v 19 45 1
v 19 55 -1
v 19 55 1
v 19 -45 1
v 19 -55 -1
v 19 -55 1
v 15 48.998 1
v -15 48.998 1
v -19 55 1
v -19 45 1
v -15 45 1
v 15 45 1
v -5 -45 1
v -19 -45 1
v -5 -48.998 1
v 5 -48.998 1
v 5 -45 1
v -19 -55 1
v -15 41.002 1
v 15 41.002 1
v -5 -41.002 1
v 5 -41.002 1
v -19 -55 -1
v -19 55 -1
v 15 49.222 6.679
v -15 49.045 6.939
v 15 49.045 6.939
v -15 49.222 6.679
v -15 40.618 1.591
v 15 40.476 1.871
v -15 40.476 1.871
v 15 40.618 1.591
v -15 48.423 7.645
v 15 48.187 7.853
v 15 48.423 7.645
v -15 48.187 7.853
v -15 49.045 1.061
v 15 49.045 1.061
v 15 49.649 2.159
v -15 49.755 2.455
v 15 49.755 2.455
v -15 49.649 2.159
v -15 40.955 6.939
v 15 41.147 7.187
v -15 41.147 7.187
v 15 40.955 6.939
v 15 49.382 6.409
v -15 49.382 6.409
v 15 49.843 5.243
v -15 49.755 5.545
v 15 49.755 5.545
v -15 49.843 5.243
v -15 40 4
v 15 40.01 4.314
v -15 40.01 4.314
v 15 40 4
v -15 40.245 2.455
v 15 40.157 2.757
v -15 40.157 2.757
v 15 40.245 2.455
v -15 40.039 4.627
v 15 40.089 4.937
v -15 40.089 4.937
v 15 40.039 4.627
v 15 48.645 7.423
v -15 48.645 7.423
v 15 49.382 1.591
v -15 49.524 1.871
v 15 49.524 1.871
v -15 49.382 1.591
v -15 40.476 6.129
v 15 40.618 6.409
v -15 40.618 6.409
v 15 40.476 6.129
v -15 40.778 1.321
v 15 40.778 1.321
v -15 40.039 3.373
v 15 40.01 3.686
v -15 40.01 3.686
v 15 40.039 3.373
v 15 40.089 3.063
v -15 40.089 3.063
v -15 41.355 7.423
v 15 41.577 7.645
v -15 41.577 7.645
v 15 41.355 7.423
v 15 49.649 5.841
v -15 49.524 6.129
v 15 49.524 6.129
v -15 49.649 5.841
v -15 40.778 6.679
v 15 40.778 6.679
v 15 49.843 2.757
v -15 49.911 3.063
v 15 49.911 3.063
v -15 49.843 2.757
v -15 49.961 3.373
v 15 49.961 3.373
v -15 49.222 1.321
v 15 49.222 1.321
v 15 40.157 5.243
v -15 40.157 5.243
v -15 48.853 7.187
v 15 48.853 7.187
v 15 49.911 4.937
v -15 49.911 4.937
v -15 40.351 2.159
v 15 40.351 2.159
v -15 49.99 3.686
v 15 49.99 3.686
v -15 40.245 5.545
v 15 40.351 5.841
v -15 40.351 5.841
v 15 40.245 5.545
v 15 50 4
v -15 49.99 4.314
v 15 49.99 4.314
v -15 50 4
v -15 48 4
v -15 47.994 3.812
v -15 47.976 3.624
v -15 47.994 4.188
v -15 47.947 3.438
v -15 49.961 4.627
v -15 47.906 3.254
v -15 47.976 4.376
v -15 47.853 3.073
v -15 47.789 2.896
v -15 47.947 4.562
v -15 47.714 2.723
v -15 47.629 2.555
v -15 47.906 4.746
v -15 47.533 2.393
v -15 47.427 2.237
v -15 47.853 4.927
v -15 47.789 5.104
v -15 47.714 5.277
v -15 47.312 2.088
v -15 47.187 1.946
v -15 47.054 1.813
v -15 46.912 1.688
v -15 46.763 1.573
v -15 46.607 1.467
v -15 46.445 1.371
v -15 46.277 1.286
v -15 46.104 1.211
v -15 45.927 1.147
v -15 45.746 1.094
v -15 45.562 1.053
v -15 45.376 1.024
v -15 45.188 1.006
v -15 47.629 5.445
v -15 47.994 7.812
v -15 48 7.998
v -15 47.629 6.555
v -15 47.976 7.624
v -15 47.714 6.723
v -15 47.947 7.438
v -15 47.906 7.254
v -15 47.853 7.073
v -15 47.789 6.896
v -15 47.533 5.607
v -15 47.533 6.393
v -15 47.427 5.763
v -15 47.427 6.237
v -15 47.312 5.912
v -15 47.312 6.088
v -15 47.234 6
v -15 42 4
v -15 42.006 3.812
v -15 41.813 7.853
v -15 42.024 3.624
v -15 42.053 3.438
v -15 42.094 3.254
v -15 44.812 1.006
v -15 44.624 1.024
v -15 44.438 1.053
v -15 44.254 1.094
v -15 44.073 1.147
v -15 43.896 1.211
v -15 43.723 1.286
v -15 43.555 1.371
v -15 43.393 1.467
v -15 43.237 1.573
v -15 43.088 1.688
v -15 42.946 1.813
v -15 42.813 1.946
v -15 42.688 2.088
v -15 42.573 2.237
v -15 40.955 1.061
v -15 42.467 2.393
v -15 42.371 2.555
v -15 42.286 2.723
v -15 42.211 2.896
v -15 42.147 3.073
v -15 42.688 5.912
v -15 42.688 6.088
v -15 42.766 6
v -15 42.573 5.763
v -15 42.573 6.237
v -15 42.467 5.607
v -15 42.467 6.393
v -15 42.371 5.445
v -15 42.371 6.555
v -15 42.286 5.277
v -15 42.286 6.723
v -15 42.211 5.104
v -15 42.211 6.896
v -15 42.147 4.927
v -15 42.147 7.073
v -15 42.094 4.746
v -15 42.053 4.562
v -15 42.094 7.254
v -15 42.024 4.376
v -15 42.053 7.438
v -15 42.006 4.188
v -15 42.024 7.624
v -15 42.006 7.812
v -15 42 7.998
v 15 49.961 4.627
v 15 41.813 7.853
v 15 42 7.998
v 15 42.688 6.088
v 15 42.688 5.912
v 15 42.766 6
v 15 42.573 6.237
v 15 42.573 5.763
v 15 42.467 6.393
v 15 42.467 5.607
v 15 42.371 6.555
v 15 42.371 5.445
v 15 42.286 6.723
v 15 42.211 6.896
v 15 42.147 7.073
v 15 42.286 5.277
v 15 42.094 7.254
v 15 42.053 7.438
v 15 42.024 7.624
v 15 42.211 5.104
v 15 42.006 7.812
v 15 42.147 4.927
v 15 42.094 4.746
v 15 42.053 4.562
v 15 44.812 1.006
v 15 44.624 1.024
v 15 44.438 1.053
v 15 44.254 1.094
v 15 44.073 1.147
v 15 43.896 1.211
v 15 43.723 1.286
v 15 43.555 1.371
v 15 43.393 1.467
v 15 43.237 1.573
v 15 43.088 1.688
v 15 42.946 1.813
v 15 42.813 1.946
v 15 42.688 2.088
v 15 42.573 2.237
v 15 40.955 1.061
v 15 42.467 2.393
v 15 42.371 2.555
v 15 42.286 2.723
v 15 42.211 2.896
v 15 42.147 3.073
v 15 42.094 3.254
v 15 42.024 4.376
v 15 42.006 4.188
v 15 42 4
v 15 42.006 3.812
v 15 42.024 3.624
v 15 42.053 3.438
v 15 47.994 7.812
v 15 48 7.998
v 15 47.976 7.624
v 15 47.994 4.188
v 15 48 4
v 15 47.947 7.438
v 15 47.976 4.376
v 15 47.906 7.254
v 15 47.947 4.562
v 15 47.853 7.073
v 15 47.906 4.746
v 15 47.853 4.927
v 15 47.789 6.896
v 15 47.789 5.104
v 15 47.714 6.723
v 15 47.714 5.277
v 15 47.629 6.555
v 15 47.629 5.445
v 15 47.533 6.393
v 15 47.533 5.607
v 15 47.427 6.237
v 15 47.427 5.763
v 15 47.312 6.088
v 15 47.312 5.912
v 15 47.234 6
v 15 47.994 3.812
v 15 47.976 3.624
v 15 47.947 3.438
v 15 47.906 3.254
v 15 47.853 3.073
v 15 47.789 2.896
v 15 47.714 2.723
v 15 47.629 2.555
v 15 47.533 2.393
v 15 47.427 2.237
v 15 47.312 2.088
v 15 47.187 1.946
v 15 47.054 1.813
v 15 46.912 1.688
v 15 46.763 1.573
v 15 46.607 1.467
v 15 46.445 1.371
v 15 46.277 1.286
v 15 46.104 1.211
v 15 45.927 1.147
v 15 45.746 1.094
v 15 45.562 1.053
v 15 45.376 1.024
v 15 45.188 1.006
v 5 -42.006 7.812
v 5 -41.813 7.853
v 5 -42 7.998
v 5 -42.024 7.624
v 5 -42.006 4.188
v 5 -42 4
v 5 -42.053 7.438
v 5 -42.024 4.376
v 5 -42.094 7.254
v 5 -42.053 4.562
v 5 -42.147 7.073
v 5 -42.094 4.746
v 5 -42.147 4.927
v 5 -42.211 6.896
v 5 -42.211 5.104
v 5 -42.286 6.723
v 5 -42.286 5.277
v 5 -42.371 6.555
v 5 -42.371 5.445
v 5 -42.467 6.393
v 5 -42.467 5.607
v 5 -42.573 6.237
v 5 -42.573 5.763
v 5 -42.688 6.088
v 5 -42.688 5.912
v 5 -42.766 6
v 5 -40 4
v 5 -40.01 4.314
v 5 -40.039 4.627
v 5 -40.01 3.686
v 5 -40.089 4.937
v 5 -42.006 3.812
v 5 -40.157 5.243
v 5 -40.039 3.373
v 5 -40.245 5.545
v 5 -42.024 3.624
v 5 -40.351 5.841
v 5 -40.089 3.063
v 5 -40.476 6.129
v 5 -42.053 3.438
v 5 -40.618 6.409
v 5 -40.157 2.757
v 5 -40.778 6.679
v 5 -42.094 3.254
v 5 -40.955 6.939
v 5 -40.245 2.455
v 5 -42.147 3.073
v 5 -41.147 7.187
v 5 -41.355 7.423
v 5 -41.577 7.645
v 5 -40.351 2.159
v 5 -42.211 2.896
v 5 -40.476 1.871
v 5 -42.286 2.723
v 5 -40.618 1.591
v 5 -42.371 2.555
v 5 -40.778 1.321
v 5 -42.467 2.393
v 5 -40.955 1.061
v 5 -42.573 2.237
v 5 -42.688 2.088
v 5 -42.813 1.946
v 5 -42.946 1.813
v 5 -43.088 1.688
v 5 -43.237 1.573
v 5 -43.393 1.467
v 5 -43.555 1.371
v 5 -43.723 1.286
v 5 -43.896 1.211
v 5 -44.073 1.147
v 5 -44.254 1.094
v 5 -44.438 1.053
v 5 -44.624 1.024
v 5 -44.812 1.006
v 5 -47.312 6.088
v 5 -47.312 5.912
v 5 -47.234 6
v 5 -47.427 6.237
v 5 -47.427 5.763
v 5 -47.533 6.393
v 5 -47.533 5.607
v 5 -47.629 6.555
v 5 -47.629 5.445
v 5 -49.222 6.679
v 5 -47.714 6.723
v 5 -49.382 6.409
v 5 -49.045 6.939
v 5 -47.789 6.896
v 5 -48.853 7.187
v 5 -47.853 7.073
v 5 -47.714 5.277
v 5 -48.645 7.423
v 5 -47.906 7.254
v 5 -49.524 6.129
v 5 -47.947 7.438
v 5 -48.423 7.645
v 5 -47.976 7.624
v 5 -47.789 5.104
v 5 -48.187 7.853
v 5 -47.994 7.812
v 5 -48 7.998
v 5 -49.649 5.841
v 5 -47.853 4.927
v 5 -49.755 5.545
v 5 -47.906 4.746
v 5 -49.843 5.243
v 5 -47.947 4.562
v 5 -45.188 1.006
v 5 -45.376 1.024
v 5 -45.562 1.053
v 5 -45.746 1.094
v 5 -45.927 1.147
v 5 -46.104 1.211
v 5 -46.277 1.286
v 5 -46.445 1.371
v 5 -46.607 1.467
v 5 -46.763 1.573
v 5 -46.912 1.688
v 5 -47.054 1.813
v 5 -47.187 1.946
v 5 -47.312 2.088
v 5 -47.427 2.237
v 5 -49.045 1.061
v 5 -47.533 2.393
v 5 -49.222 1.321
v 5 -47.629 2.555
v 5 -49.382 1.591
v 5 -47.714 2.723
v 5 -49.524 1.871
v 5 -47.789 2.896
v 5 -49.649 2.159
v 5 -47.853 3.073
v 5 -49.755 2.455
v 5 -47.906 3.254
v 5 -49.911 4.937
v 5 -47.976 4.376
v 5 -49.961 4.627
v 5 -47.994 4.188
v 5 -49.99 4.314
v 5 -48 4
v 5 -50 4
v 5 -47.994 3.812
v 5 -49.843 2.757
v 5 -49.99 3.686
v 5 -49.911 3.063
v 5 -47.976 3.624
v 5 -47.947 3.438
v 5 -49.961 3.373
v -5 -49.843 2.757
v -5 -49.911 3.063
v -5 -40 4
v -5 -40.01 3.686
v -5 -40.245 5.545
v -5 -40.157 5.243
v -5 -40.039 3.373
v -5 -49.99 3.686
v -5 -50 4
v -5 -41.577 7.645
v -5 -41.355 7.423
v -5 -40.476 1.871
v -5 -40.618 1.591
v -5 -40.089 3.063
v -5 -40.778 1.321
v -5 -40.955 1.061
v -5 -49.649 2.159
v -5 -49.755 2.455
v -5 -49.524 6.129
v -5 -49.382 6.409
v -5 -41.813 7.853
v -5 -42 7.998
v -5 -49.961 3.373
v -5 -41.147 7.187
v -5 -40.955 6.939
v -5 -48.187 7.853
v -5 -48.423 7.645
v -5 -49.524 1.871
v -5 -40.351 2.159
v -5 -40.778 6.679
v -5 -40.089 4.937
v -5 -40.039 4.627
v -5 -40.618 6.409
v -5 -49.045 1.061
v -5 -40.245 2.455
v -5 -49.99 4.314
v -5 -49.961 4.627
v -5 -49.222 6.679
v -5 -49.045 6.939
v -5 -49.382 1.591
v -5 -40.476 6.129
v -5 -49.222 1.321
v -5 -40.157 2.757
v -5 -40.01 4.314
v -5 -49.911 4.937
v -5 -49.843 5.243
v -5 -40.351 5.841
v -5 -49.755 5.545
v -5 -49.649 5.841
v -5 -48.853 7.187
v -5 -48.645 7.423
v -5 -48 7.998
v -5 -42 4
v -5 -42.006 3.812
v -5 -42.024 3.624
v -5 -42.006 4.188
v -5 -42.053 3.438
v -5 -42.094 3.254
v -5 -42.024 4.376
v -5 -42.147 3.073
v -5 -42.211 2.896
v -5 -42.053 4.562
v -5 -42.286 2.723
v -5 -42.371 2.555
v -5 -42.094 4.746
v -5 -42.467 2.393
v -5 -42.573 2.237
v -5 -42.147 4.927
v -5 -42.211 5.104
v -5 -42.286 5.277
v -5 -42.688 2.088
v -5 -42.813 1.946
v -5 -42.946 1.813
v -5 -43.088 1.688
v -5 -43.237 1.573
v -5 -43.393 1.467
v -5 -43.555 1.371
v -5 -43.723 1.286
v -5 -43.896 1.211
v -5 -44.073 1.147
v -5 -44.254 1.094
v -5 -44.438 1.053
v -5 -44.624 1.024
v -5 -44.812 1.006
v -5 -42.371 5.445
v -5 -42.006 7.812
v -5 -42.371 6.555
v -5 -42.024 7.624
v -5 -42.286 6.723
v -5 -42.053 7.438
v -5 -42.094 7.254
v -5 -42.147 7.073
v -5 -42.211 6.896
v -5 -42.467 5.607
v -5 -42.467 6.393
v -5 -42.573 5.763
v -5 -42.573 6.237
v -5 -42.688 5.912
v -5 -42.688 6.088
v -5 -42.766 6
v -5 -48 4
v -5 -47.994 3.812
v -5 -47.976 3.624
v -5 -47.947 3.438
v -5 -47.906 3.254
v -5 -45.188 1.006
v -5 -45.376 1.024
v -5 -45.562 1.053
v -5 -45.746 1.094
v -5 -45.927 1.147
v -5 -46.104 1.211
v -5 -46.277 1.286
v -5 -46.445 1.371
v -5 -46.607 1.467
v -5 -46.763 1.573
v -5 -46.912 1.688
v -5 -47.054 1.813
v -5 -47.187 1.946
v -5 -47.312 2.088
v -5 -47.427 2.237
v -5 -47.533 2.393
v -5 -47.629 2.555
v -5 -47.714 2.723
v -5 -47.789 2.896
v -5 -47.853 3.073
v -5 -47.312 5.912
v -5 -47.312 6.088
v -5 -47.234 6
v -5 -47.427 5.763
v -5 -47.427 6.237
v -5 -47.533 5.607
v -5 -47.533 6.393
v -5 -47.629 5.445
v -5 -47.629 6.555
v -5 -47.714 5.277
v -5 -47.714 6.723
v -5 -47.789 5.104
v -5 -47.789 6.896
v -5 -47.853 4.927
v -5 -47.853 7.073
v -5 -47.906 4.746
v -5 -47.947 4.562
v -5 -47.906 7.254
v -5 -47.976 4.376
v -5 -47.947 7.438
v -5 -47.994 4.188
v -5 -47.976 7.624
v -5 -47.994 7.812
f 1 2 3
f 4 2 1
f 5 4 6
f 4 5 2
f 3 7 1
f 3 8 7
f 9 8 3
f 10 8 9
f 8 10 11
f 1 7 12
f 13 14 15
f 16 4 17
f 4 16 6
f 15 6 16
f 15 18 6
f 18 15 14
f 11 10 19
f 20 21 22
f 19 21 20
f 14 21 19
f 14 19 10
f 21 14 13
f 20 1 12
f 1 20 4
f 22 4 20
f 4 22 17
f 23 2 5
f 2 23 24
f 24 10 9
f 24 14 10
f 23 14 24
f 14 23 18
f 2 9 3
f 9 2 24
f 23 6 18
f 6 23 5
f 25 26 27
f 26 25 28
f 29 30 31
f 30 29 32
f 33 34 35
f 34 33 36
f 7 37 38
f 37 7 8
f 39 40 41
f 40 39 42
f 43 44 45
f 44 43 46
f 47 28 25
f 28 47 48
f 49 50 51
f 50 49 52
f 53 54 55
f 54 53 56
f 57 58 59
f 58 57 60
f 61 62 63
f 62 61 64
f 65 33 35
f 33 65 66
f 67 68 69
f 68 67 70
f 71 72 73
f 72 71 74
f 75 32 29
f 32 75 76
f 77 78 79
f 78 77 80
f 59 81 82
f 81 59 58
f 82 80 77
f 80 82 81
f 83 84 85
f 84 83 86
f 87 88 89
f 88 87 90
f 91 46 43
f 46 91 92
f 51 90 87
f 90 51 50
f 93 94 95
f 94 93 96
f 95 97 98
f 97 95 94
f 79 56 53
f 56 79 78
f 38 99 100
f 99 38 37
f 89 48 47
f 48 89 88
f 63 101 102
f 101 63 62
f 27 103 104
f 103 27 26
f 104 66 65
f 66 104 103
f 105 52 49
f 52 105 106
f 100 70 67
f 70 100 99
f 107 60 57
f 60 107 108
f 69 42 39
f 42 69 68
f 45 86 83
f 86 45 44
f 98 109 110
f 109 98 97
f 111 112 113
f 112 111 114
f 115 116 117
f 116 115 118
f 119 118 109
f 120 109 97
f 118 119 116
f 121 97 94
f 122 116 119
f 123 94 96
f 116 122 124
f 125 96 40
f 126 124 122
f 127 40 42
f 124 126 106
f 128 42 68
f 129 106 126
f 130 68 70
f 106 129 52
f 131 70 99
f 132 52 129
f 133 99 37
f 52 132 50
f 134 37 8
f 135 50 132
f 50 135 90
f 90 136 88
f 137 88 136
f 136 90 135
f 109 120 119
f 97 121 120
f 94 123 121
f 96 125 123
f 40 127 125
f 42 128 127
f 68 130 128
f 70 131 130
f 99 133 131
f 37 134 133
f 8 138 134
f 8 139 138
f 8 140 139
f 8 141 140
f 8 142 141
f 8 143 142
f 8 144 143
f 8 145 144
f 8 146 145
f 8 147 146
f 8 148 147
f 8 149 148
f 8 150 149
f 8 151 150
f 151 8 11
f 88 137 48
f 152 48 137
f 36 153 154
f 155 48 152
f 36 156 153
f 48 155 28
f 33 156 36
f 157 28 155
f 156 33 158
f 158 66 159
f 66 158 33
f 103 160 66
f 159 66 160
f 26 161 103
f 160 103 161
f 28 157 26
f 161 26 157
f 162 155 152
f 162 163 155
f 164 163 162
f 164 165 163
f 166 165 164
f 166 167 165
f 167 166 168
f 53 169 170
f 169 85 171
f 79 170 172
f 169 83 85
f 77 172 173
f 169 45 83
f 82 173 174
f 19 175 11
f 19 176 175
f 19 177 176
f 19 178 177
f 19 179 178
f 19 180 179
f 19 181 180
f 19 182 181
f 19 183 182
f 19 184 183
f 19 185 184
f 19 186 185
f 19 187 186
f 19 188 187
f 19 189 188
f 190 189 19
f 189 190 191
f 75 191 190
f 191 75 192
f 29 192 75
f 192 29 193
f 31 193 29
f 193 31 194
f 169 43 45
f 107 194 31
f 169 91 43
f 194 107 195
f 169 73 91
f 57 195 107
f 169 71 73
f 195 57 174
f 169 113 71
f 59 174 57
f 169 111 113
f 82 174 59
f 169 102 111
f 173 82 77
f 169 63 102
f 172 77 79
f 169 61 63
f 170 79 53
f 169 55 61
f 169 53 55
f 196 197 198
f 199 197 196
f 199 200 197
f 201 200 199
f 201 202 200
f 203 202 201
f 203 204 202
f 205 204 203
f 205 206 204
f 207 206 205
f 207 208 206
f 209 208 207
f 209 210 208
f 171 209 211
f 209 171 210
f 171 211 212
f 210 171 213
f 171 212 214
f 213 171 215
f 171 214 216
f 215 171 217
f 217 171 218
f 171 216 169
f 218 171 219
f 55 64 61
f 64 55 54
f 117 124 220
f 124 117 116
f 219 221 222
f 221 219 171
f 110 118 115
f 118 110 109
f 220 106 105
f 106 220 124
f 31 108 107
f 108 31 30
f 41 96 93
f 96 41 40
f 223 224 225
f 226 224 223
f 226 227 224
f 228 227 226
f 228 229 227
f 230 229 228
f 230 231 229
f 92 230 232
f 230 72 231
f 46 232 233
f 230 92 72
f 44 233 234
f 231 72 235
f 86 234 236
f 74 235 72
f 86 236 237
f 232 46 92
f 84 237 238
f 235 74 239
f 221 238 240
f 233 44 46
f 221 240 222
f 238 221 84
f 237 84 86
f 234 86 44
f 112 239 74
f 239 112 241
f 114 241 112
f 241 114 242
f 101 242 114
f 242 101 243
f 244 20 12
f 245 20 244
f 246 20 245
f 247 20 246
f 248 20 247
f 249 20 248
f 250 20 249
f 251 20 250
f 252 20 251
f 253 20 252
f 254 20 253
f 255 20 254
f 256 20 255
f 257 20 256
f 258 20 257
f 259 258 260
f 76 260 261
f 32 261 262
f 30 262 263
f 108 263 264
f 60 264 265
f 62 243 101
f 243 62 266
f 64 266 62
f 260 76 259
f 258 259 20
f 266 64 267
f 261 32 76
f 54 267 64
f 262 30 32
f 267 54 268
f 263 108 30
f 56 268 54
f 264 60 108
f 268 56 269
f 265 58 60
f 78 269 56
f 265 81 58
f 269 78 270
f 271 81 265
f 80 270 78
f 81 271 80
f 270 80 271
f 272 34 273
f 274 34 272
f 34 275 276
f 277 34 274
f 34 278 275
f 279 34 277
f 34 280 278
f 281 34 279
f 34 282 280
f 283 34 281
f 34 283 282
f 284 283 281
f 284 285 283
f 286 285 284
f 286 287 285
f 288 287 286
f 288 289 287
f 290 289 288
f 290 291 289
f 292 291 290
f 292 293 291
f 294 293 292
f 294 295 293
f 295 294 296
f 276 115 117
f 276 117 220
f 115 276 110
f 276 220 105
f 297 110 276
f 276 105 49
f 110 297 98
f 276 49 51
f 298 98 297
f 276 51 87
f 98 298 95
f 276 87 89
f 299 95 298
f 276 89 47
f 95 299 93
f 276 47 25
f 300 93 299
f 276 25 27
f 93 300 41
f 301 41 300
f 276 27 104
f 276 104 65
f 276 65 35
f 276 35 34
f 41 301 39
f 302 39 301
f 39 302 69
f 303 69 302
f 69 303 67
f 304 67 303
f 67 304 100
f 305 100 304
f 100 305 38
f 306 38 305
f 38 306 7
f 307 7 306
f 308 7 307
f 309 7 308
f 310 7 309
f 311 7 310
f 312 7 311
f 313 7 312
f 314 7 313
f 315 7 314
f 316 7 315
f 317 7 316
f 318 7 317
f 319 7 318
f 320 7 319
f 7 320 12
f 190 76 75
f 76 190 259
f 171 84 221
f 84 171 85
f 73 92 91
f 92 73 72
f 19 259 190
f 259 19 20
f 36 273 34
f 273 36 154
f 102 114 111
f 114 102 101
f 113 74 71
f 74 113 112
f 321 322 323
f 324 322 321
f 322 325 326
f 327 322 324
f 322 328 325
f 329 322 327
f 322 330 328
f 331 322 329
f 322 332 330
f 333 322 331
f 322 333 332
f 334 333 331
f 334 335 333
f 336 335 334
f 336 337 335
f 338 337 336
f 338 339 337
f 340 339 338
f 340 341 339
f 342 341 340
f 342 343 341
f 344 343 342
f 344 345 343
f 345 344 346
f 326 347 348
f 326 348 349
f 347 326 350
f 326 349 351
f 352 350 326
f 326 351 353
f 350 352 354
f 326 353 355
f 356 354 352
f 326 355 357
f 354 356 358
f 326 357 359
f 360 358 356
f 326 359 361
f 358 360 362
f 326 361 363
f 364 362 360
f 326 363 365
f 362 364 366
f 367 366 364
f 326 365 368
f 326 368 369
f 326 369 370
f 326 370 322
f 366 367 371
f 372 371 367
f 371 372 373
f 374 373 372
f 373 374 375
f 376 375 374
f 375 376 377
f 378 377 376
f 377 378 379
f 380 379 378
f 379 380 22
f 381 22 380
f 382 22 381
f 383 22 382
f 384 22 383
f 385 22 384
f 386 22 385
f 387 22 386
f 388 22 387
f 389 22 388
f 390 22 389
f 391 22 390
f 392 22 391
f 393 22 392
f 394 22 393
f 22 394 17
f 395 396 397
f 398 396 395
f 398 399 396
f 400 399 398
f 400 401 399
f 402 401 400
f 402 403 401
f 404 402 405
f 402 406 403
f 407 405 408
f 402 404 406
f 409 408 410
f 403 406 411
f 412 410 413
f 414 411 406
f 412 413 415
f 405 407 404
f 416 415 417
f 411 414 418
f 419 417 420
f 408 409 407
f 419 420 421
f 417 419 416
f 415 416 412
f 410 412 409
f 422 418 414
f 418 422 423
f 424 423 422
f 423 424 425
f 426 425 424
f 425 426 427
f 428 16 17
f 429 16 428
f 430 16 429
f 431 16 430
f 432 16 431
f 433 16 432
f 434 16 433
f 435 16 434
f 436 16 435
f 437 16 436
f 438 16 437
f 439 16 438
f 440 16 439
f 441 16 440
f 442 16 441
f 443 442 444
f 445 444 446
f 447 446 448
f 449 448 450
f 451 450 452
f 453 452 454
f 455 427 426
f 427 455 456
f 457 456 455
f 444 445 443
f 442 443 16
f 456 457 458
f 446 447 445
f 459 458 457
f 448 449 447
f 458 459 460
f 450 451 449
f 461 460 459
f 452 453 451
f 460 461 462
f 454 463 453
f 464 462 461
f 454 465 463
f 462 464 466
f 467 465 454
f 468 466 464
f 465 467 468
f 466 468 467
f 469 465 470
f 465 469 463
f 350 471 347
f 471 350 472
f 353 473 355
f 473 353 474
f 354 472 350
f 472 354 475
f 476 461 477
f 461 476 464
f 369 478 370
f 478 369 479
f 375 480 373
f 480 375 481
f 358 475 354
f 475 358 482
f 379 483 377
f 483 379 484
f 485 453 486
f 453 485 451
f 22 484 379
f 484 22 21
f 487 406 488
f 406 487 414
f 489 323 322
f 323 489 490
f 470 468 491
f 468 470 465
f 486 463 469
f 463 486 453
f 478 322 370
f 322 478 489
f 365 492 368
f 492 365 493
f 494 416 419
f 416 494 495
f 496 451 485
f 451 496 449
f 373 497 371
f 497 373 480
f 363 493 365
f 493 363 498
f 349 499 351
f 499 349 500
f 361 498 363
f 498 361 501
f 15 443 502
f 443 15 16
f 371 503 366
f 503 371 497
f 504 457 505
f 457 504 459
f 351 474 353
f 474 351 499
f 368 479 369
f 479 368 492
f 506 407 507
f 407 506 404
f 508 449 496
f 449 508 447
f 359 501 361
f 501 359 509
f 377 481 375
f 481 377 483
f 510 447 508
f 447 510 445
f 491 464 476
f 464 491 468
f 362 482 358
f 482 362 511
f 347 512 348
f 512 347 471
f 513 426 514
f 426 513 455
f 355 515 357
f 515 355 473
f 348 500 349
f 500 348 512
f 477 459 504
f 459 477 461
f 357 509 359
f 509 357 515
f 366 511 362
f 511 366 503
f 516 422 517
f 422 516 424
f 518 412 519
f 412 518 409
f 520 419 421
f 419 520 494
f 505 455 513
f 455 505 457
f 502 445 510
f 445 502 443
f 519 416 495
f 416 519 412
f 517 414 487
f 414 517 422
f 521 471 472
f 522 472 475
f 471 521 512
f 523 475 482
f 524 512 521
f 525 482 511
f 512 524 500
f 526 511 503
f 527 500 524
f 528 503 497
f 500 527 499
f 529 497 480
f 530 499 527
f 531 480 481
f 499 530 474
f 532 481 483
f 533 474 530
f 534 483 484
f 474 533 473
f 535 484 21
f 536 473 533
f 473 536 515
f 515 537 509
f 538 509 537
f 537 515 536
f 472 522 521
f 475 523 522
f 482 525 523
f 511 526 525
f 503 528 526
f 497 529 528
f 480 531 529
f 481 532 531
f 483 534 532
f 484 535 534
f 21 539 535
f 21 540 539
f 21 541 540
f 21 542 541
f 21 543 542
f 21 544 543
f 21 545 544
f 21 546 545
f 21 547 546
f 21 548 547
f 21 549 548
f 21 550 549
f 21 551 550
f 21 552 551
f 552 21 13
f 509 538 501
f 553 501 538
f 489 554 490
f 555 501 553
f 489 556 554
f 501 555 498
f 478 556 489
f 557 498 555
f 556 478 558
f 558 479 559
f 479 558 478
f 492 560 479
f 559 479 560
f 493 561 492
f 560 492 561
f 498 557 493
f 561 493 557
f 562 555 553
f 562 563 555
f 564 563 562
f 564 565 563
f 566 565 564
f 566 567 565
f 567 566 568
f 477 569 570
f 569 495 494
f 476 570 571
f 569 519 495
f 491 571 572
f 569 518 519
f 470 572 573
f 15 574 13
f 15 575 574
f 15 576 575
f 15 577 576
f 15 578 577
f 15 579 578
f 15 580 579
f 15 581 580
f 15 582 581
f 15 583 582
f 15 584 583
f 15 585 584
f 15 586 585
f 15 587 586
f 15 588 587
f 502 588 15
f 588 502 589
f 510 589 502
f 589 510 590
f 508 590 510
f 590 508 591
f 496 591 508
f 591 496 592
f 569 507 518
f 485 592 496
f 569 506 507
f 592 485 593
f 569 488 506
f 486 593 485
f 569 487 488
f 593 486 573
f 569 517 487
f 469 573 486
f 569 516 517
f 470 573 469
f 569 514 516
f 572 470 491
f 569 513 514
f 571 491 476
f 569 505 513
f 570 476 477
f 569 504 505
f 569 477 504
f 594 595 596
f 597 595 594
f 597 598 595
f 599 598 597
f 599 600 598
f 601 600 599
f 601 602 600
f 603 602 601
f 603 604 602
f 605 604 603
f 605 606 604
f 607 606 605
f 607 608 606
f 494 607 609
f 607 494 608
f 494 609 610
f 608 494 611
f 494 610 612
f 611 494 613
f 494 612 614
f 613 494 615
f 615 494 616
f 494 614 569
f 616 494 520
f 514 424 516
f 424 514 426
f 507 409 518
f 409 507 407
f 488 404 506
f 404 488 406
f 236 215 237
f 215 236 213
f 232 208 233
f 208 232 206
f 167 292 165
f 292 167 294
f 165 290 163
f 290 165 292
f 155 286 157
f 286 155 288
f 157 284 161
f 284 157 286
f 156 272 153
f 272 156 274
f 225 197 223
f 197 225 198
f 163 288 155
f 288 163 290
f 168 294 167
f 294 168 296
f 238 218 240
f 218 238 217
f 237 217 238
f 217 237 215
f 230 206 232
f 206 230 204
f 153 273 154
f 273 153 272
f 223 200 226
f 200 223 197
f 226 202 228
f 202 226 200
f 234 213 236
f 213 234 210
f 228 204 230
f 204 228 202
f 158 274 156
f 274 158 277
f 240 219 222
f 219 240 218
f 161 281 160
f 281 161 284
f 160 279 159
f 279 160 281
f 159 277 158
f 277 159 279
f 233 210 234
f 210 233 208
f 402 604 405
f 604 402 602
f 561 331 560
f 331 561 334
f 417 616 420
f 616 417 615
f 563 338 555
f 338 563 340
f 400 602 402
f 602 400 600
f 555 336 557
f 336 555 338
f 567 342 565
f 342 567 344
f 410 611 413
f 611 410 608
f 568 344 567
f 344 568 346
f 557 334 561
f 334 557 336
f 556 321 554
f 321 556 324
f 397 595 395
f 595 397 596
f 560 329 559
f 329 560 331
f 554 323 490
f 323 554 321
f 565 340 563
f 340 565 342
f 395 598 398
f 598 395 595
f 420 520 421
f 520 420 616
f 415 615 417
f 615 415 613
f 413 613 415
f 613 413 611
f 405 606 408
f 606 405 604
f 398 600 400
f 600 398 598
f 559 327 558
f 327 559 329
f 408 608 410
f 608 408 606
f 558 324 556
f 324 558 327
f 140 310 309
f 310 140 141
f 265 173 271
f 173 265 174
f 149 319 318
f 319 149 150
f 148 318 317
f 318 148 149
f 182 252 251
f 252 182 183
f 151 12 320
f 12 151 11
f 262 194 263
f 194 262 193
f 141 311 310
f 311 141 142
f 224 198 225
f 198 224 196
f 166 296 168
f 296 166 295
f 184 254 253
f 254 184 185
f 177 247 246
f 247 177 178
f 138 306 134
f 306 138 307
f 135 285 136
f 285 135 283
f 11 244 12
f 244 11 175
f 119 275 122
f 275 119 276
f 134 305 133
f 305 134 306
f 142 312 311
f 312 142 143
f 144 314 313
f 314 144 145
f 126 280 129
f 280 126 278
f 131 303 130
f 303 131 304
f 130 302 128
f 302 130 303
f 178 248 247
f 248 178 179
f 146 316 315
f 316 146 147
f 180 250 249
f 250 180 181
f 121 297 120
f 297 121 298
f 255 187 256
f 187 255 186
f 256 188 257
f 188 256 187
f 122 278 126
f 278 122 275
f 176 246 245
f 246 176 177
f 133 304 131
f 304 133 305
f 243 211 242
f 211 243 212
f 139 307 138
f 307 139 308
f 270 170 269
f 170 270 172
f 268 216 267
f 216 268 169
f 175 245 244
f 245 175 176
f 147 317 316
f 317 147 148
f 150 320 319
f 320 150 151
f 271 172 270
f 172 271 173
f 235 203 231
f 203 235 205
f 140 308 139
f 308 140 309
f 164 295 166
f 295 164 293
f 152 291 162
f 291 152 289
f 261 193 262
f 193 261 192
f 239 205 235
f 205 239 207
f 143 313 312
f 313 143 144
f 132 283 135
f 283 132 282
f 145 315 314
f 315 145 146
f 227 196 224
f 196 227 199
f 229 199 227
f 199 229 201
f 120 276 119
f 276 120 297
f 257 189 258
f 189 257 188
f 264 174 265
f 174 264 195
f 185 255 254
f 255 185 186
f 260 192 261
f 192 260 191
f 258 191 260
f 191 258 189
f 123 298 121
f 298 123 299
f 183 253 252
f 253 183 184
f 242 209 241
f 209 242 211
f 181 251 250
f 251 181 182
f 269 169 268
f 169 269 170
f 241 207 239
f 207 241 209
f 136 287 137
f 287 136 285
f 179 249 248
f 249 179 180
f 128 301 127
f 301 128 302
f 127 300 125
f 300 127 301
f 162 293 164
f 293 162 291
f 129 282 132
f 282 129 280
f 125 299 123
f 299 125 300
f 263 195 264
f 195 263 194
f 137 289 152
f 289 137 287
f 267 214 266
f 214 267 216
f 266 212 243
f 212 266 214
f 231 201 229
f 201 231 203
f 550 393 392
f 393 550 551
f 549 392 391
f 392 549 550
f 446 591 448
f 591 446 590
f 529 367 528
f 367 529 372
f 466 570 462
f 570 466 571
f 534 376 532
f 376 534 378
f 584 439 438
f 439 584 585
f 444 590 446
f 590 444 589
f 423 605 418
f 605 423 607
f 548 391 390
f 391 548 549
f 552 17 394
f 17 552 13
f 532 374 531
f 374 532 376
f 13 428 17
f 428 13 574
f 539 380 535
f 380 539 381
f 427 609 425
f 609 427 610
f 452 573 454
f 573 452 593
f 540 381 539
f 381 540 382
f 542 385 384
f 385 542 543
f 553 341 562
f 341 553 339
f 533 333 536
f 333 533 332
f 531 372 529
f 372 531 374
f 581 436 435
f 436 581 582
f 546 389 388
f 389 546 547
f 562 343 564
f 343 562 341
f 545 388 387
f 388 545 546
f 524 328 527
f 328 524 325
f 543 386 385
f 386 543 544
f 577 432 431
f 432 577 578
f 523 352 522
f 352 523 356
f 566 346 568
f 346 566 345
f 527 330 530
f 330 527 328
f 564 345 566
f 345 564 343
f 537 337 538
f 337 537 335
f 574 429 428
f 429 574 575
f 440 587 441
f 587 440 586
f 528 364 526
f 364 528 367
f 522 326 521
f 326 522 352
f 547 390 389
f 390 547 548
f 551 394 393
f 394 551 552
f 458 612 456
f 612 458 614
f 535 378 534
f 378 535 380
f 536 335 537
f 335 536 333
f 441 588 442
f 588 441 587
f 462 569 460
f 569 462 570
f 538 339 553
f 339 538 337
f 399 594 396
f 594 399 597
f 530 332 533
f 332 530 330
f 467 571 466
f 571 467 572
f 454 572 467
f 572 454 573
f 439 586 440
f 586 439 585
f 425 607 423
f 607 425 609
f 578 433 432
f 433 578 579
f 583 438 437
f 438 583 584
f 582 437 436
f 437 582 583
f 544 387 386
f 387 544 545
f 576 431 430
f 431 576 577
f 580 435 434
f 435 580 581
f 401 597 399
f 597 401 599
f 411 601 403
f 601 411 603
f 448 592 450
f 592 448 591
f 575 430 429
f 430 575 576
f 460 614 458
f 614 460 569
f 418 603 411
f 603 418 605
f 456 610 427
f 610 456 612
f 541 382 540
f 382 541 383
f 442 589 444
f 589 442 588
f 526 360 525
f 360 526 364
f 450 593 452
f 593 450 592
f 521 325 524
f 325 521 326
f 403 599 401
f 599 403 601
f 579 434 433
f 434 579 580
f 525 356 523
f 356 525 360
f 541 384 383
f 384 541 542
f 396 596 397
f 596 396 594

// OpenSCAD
$fa=5; 
$fn=100;

translate([0,0,0]) {
difference() {
    union(){
        
        translate([0,0,0]) {
        cube([38, 110, 2], true);
        }


        translate([0,45,4]){
            rotate([0,90,0]) {
                cylinder(30, 5, 5, true);
            }
        }

        translate([0,-45,4]){
            rotate([0,90,0]) {
                cylinder(10, 5, 5, true);
            }
        }
    }


    union() {
        
        
        
        translate([0,45,8]){
            rotate([0,90,0]) {
                cylinder(100, 3, 3, true);
            }
        }


        translate([0,-45,8]){
            rotate([0,90,0]) {
                cylinder(100, 3, 3, true);
            }
        }
        
        

        translate([0,45,4]){
            rotate([0,90,0]) {
                cylinder(100, 3, 3, true);
            }
        }


        translate([0,-45,4]){
            rotate([0,90,0]) {
                cylinder(100, 3, 3, true);
            }
        }

    }
}
}
